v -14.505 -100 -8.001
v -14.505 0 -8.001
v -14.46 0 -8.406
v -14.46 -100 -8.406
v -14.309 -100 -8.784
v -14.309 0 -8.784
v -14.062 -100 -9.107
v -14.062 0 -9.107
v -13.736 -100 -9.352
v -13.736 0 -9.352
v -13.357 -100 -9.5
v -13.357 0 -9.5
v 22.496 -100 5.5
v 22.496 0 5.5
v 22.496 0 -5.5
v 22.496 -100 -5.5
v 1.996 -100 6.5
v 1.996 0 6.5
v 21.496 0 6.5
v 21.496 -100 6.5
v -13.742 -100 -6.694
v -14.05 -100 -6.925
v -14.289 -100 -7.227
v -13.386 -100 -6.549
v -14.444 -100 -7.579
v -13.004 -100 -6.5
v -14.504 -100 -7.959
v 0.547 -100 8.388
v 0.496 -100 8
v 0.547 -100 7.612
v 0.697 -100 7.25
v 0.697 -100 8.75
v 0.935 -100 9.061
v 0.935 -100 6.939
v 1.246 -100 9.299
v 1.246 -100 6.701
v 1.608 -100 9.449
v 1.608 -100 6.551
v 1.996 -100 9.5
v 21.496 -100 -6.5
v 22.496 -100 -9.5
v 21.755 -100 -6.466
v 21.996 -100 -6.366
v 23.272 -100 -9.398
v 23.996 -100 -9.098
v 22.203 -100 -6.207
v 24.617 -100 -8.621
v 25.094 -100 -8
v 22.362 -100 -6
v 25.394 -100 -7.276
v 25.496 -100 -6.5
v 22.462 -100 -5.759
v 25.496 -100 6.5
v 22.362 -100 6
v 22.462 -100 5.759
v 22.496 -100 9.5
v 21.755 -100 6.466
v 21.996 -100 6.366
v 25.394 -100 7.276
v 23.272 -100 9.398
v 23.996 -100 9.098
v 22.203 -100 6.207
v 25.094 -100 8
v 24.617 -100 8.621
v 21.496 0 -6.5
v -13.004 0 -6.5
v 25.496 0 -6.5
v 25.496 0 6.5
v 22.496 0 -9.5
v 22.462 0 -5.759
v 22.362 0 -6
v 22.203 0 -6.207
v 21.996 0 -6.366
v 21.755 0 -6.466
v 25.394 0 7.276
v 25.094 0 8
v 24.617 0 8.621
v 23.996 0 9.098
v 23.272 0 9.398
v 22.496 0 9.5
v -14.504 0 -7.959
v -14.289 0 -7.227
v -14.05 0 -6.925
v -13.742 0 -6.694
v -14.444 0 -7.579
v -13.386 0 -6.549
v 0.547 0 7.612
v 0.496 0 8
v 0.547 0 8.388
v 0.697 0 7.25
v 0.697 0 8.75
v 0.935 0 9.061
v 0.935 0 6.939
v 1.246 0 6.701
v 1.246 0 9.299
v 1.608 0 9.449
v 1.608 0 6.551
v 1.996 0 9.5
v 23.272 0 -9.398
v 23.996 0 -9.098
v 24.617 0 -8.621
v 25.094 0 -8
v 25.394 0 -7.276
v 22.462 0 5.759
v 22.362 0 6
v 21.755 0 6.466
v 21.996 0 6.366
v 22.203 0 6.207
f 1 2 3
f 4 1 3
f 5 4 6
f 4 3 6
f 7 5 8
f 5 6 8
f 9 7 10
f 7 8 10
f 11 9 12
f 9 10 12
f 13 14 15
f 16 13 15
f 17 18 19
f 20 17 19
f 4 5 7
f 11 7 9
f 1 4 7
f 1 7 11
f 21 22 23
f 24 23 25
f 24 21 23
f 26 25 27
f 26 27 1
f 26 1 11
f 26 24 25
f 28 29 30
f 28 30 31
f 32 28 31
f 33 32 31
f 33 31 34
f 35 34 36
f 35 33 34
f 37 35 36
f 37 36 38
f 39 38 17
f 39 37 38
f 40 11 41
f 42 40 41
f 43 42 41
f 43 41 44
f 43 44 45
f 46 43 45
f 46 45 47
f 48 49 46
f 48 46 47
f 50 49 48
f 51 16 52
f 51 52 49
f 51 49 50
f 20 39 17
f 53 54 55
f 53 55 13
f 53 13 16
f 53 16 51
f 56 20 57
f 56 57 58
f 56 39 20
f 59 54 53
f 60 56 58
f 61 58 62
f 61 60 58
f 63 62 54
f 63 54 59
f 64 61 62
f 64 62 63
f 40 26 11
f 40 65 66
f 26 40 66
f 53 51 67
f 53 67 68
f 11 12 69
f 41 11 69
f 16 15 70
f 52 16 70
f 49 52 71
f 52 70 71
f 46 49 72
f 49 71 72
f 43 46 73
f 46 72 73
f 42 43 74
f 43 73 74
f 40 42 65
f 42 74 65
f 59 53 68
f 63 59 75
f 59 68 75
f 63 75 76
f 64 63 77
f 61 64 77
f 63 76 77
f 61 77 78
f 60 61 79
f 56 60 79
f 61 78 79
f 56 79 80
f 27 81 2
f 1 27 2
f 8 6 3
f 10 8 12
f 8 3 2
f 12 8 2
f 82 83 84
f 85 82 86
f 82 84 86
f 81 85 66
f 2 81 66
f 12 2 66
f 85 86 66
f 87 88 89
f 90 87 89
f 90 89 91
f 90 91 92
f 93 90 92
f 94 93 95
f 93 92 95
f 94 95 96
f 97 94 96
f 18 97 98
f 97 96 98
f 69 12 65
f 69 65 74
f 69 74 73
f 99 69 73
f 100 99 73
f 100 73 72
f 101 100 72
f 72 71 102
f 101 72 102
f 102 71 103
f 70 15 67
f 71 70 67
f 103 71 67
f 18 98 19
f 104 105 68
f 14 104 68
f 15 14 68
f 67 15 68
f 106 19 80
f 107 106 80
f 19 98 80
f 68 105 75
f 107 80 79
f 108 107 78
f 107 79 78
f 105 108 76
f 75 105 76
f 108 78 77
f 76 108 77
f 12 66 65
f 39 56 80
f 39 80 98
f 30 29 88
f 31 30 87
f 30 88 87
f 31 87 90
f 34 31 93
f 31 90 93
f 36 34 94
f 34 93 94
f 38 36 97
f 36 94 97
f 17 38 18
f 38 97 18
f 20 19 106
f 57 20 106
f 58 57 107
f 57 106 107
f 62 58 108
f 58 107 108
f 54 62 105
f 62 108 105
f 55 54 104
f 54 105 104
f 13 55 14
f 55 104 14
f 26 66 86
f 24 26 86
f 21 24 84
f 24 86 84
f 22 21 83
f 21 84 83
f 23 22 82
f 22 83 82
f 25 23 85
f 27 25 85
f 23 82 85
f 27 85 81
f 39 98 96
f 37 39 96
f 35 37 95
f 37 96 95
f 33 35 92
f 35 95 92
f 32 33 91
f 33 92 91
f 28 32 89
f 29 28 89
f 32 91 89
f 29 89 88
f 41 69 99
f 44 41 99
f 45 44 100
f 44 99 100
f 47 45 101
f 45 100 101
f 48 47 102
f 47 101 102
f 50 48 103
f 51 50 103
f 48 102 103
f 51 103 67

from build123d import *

# Parameters (mm, degrees)
F1_DEPTH = 100


with BuildPart() as f1:
    # F0 (on Front) → F1 (new body)
    with BuildSketch(Plane.XZ):
        with BuildLine():
            Line((1.99592, 6.5), (21.49592, 6.5))
            ThreePointArc((21.49592, 6.5), (22.203027, 6.207107), (22.49592, 5.5))
            Line((22.49592, 5.5), (22.49592, -5.5))
            ThreePointArc((22.49592, -5.5), (22.203027, -6.207107), (21.49592, -6.5))
            Line((21.49592, -6.5), (-13.00408, -6.5))
            ThreePointArc((-13.00408, -6.5), (-14.050214, -6.92501), (-14.503525, -7.959196))
            Line((-14.503525, -7.959196), (-14.504665, -8.00111))
            ThreePointArc((-14.504665, -8.00111), (-14.196328, -8.95365), (-13.357338, -9.5))
            Line((-13.357338, -9.5), (22.49592, -9.5))
            ThreePointArc((22.49592, -9.5), (24.617241, -8.62132), (25.49592, -6.5))
            Line((25.49592, -6.5), (25.49592, 5.5))
            Line((25.49592, 5.5), (25.49592, 6.5))
            ThreePointArc((25.49592, 6.5), (24.617241, 8.62132), (22.49592, 9.5))
            Line((22.49592, 9.5), (1.99592, 9.5))
            ThreePointArc((1.99592, 9.5), (0.93526, 9.06066), (0.49592, 8))
            ThreePointArc((0.49592, 8), (0.93526, 6.93934), (1.99592, 6.5))
        make_face()
    extrude(amount=F1_DEPTH)


solid = f1.part
